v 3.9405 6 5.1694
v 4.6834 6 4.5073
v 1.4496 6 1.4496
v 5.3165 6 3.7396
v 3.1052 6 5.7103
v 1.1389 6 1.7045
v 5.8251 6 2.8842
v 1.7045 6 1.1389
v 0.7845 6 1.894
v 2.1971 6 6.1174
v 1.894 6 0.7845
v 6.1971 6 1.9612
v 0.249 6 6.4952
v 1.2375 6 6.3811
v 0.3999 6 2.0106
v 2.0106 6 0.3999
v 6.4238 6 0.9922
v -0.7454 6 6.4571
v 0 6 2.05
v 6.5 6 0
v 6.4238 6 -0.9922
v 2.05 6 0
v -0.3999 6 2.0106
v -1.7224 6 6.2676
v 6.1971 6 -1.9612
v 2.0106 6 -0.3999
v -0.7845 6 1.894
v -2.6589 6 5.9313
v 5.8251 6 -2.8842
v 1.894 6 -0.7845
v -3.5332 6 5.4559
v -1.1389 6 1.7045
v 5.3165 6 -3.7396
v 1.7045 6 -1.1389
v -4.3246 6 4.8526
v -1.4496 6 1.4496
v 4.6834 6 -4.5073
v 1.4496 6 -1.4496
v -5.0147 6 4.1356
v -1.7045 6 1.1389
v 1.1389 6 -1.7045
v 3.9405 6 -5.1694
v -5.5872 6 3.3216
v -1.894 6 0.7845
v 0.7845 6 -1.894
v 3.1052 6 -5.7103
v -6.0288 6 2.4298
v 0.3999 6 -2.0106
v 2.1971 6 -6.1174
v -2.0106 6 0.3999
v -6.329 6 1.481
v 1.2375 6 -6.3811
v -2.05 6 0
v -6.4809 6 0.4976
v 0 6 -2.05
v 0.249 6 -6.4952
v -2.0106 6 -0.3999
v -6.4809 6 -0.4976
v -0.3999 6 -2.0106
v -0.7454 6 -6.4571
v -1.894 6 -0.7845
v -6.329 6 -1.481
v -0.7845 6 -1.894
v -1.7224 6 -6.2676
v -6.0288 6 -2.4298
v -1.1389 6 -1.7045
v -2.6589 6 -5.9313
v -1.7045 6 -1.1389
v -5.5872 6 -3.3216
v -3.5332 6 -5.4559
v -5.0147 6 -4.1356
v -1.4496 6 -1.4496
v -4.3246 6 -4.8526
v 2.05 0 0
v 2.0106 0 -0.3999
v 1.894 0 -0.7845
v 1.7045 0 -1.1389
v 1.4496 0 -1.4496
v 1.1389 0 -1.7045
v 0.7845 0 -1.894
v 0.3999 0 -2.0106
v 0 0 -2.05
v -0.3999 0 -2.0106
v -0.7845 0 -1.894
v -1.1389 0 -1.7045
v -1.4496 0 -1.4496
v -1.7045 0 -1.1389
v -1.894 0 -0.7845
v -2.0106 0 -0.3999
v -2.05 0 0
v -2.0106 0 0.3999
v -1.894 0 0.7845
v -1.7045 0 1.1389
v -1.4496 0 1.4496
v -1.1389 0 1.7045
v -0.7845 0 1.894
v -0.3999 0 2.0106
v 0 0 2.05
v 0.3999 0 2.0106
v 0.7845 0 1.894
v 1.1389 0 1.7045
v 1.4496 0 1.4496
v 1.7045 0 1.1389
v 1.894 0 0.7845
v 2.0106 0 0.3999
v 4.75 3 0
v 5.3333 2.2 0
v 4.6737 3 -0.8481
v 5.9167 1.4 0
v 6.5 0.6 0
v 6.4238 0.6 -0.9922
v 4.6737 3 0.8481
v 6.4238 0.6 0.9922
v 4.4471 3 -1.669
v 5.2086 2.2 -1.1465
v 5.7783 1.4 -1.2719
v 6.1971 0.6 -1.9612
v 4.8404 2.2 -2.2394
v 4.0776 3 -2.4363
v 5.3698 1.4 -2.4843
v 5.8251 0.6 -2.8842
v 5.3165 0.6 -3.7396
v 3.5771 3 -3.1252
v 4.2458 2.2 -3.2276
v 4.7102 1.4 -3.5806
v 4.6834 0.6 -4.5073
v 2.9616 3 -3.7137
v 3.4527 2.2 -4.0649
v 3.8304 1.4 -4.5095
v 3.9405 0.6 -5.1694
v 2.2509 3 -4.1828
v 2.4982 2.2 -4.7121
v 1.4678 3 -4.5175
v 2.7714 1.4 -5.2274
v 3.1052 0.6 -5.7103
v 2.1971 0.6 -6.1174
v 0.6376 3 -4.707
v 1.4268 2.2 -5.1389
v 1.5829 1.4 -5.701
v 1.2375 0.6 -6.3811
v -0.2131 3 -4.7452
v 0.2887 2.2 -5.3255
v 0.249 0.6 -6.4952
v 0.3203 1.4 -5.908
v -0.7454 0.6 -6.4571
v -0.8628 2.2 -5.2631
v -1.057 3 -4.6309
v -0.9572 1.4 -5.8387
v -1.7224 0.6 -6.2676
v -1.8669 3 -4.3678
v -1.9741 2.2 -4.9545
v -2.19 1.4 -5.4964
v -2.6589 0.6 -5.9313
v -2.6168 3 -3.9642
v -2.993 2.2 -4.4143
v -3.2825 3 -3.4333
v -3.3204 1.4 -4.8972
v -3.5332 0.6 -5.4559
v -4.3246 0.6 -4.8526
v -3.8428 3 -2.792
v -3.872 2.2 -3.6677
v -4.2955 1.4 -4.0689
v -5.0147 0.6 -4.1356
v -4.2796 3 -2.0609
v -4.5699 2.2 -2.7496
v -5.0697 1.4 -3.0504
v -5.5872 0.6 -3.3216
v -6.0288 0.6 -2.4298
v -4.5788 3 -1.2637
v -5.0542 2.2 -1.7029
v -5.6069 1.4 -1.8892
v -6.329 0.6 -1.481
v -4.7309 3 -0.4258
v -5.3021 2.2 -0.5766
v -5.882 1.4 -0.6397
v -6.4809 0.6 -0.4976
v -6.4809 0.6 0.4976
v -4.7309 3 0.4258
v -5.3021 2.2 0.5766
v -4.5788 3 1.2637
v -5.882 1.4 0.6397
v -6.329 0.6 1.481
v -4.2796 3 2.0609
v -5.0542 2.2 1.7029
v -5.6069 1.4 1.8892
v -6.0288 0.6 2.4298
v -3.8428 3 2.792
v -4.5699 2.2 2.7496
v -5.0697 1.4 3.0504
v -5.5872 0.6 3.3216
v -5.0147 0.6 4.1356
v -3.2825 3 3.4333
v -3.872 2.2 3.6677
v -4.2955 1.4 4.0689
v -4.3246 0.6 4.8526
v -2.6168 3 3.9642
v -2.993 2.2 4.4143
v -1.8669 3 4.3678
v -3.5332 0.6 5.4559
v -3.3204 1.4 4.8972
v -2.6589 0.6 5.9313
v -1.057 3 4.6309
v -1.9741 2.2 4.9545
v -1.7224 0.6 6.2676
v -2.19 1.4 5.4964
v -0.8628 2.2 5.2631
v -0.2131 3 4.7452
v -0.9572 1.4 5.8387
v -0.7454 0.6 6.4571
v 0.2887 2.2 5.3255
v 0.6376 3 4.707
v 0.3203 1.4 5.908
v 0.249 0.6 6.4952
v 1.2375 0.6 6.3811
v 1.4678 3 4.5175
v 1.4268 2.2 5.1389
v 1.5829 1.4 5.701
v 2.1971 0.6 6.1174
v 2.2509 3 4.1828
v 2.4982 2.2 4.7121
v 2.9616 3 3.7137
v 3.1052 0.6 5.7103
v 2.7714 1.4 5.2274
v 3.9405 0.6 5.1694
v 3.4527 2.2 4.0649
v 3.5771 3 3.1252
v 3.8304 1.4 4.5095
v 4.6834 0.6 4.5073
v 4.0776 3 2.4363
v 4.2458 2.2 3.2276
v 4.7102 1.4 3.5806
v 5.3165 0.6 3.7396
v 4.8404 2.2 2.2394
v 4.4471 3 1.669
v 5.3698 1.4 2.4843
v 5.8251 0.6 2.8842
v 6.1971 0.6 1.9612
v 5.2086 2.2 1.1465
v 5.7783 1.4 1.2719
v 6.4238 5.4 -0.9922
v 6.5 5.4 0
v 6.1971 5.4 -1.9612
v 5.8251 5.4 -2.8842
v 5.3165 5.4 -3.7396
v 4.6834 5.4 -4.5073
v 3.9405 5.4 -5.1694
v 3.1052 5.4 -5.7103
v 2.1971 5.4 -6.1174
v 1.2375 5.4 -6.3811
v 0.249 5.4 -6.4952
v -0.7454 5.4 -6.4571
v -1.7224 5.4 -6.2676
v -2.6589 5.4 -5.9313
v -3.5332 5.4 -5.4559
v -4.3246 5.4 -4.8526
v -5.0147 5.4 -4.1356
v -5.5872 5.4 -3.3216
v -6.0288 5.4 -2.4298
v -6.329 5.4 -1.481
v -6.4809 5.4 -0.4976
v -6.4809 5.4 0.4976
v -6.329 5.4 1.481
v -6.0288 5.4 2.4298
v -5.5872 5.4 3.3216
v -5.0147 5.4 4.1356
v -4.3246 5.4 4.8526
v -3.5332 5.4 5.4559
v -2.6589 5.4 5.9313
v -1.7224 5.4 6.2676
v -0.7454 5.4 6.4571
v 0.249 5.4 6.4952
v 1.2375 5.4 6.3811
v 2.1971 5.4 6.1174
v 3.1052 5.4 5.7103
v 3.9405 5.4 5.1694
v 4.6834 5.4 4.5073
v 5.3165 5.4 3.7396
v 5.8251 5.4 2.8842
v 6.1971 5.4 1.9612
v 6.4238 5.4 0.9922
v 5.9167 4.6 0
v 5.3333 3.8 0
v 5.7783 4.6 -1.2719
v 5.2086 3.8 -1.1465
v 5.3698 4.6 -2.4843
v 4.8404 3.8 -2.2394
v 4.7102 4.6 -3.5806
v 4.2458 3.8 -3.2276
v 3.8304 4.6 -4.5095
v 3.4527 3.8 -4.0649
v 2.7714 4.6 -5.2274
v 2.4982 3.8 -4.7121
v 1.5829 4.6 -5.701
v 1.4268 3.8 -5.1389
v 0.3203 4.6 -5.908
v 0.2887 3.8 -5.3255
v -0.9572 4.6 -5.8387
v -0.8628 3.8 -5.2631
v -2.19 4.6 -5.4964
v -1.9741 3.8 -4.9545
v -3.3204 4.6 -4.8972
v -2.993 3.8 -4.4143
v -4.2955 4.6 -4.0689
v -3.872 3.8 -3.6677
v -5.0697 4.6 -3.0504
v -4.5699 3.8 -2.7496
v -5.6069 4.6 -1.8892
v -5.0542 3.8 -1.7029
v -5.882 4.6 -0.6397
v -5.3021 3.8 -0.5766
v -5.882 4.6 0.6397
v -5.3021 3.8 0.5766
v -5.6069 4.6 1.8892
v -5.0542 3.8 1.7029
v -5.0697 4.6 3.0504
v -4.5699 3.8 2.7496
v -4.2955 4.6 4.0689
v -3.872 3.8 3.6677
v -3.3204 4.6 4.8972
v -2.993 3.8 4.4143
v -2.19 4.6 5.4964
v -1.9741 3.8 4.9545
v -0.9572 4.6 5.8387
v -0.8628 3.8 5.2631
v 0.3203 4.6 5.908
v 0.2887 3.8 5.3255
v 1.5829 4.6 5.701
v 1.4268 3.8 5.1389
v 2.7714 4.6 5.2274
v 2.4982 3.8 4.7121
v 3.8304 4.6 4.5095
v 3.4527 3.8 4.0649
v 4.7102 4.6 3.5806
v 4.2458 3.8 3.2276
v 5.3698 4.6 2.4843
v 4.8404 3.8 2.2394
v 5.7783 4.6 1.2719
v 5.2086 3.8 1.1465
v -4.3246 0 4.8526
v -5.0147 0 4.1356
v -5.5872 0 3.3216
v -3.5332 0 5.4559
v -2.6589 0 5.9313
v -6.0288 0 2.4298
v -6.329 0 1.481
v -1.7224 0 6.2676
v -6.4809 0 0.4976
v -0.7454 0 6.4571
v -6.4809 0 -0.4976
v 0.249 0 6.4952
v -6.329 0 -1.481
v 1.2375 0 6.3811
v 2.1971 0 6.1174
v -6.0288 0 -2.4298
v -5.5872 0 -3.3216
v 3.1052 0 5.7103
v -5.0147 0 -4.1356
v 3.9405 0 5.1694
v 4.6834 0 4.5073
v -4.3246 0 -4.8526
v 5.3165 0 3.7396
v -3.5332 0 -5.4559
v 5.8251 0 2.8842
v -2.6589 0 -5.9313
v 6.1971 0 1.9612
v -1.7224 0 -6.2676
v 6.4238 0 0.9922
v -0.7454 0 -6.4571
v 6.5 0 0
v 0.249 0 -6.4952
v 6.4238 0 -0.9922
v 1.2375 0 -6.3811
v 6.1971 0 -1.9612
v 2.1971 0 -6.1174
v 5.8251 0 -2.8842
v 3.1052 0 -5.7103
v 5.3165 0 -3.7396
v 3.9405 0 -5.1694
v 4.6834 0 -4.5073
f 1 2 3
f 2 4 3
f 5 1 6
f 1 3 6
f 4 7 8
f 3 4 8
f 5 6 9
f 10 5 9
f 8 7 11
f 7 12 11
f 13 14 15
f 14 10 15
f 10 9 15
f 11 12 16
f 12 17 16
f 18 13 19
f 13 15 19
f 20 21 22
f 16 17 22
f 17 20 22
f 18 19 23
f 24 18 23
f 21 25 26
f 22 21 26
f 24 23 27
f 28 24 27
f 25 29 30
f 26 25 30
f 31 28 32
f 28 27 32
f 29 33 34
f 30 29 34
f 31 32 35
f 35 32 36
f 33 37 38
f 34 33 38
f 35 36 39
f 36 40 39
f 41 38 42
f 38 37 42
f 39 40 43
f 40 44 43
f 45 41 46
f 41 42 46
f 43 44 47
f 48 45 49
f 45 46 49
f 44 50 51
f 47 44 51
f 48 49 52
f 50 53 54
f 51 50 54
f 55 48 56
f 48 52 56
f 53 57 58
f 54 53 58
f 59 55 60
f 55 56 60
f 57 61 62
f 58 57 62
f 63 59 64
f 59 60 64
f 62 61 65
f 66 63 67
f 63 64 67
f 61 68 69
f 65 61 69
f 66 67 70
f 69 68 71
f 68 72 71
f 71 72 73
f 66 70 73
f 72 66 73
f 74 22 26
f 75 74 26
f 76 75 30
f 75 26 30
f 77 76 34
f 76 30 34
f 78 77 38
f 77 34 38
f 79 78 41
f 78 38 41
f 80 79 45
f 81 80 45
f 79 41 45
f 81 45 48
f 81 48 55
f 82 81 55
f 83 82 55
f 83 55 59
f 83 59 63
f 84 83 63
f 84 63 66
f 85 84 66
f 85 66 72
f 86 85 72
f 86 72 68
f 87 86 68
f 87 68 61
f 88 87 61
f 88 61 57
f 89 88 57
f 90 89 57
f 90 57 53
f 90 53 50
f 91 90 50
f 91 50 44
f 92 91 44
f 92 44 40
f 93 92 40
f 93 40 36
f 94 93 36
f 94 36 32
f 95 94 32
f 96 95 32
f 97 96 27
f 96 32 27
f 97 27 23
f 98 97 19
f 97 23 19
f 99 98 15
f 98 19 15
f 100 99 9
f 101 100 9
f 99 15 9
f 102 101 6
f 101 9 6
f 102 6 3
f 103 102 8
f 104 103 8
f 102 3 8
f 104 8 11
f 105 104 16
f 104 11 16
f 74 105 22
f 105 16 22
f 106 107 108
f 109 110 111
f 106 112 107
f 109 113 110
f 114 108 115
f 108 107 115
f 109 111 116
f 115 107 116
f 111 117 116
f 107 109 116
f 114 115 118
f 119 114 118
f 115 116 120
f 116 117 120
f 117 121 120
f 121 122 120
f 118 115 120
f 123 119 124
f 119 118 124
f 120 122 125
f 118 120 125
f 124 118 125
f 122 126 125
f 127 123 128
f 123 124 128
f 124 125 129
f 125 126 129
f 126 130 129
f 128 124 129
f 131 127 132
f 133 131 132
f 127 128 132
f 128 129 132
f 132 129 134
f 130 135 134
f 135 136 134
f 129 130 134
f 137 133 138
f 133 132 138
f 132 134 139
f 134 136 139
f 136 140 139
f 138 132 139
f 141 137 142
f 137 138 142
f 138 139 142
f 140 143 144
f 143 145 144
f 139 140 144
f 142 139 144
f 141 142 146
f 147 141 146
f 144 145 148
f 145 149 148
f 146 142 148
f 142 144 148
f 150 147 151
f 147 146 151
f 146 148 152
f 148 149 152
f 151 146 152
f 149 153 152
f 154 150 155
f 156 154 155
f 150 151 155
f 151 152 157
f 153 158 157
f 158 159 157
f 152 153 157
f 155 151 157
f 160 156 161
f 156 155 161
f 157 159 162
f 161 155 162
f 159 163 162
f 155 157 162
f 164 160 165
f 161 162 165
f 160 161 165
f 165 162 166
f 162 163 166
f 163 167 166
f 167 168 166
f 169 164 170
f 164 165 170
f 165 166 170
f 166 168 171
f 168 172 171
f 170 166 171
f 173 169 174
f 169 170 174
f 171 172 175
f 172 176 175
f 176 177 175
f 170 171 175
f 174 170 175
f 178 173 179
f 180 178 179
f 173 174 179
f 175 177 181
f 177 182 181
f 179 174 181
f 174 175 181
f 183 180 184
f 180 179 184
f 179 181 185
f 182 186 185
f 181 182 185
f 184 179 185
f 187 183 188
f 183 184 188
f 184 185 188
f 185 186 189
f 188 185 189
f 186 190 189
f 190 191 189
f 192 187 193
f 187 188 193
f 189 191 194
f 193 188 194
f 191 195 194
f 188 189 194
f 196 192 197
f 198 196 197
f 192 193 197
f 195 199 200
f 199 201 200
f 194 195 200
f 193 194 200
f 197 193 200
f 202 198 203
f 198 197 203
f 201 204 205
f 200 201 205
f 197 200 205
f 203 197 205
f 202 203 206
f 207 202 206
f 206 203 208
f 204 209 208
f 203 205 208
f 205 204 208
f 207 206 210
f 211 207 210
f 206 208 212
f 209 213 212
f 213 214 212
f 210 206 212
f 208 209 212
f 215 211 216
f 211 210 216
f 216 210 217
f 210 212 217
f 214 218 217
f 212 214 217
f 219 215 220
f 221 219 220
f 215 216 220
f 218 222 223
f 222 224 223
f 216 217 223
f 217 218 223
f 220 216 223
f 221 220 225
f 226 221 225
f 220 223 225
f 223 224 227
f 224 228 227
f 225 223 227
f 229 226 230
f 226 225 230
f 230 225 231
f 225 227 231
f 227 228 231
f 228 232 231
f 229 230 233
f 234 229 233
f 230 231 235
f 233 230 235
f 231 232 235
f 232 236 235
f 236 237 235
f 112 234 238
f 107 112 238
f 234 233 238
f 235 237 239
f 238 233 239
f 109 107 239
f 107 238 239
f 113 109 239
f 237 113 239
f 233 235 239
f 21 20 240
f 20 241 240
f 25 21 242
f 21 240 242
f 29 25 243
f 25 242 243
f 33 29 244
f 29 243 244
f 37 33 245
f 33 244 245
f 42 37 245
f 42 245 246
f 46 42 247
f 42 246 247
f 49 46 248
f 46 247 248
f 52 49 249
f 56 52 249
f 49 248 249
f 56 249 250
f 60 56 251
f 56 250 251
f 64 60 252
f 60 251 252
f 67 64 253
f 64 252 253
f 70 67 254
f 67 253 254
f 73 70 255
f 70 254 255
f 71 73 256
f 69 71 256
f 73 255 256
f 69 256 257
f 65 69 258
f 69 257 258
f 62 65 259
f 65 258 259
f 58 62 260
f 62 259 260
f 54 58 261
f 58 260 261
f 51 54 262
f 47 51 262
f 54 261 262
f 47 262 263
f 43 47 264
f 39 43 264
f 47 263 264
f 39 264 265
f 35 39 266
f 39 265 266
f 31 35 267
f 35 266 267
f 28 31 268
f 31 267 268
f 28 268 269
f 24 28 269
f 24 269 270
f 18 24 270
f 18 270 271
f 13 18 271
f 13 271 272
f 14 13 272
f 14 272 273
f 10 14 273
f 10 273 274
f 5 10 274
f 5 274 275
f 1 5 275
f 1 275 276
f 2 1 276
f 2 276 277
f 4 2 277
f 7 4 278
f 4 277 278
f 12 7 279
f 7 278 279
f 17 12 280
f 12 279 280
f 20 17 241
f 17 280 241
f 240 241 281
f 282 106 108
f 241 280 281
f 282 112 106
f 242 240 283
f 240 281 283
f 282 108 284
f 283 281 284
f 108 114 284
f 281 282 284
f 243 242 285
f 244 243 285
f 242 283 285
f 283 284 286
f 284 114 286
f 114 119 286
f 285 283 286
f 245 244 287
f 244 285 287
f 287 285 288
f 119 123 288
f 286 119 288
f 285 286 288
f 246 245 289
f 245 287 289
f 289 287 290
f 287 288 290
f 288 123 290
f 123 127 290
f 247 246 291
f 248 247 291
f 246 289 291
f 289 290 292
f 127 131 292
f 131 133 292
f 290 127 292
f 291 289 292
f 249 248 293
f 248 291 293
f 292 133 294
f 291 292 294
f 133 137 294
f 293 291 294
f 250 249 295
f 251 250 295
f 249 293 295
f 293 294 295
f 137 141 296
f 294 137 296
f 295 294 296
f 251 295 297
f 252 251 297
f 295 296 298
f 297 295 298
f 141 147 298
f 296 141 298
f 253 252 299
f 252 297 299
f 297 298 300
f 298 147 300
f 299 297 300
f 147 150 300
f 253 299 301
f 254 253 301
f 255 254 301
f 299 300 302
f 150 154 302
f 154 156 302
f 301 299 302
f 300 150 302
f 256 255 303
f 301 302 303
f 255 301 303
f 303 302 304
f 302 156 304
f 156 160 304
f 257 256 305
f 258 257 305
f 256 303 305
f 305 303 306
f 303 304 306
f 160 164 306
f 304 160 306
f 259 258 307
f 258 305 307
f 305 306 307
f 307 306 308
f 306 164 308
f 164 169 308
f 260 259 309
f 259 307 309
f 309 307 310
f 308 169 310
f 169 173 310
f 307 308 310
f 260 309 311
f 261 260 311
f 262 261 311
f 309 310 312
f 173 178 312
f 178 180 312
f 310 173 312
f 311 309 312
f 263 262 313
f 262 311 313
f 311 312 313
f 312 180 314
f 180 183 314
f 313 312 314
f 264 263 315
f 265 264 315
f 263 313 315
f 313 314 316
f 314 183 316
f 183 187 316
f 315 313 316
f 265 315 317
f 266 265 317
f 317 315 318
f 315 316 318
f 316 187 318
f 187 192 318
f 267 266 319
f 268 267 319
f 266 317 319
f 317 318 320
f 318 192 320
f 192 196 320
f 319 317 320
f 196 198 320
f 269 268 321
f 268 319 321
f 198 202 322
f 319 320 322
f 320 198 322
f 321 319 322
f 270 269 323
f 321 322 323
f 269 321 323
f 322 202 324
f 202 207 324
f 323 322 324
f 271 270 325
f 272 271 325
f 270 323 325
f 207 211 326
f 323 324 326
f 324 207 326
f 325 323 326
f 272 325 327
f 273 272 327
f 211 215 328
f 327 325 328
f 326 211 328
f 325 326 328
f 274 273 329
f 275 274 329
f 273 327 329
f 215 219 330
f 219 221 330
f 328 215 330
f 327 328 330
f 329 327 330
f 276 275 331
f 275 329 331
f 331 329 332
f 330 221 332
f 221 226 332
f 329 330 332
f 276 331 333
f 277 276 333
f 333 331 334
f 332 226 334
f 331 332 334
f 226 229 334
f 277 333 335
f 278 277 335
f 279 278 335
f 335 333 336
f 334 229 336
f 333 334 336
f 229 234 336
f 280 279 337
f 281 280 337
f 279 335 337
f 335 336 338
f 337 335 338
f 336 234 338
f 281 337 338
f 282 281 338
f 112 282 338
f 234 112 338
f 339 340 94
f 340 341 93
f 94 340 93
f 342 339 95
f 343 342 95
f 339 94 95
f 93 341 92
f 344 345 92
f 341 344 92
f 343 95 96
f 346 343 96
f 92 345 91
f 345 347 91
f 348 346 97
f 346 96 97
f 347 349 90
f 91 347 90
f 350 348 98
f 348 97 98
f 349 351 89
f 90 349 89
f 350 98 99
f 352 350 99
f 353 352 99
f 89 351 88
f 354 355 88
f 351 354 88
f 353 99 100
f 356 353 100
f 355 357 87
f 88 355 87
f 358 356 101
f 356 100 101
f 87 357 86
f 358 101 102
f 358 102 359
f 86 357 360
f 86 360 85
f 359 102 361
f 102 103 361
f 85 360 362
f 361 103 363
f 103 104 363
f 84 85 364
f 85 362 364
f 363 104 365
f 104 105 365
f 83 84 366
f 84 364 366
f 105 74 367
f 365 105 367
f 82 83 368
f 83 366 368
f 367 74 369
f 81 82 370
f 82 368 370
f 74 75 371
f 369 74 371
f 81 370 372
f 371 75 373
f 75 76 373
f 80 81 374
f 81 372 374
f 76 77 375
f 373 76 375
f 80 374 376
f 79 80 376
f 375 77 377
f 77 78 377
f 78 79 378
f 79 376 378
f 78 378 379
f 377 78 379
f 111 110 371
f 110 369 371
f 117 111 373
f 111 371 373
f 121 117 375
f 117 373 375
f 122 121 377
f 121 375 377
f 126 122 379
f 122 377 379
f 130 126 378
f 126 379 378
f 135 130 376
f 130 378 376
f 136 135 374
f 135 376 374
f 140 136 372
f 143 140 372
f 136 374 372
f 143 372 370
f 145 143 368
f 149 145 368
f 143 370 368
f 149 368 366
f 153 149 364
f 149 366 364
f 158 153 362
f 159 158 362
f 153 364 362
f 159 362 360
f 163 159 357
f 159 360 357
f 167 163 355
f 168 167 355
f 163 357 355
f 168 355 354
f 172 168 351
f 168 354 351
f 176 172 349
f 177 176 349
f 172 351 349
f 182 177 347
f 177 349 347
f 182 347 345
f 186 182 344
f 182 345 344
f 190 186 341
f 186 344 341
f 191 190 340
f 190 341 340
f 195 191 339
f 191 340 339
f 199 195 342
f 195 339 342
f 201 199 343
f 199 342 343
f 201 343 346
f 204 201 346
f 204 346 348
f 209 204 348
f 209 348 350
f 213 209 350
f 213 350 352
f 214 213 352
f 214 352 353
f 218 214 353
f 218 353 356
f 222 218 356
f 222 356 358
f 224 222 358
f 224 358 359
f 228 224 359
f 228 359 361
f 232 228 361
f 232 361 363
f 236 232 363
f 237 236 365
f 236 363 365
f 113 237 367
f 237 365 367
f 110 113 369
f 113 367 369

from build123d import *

# Parameters (mm, degrees)
CUT_EXTRUDE1_REACH = 8
SKETCH2_R          = 2.05


with BuildPart() as part:
    # Sketch1 → Revolve1 (revolve)
    with BuildSketch(Plane.XY):
        Polygon((0, 6), (6.5, 6), (6.5, 5.4), (4.75, 3), (6.5, 0.6), (6.5, 0), (0, 0), align=None)
    revolve(axis=Axis((0, 0, 0), (0, 1, 0)))

    # Sketch2 → Cut-Extrude1 (cut, up to next)
    with BuildSketch(Plane(origin=(0, 6, 0), x_dir=(1, 0, 0), z_dir=(0, 1, 0)), mode=Mode.PRIVATE) as cut_extrude1_sk1:
        Circle(SKETCH2_R)
    cut_extrude1_tool1 = extrude(cut_extrude1_sk1.sketch, amount=-CUT_EXTRUDE1_REACH, mode=Mode.PRIVATE) & part.part
    add(cut_extrude1_tool1.solids().sort_by_distance((0, 6, 0))[0], mode=Mode.SUBTRACT)


solid = part.part
